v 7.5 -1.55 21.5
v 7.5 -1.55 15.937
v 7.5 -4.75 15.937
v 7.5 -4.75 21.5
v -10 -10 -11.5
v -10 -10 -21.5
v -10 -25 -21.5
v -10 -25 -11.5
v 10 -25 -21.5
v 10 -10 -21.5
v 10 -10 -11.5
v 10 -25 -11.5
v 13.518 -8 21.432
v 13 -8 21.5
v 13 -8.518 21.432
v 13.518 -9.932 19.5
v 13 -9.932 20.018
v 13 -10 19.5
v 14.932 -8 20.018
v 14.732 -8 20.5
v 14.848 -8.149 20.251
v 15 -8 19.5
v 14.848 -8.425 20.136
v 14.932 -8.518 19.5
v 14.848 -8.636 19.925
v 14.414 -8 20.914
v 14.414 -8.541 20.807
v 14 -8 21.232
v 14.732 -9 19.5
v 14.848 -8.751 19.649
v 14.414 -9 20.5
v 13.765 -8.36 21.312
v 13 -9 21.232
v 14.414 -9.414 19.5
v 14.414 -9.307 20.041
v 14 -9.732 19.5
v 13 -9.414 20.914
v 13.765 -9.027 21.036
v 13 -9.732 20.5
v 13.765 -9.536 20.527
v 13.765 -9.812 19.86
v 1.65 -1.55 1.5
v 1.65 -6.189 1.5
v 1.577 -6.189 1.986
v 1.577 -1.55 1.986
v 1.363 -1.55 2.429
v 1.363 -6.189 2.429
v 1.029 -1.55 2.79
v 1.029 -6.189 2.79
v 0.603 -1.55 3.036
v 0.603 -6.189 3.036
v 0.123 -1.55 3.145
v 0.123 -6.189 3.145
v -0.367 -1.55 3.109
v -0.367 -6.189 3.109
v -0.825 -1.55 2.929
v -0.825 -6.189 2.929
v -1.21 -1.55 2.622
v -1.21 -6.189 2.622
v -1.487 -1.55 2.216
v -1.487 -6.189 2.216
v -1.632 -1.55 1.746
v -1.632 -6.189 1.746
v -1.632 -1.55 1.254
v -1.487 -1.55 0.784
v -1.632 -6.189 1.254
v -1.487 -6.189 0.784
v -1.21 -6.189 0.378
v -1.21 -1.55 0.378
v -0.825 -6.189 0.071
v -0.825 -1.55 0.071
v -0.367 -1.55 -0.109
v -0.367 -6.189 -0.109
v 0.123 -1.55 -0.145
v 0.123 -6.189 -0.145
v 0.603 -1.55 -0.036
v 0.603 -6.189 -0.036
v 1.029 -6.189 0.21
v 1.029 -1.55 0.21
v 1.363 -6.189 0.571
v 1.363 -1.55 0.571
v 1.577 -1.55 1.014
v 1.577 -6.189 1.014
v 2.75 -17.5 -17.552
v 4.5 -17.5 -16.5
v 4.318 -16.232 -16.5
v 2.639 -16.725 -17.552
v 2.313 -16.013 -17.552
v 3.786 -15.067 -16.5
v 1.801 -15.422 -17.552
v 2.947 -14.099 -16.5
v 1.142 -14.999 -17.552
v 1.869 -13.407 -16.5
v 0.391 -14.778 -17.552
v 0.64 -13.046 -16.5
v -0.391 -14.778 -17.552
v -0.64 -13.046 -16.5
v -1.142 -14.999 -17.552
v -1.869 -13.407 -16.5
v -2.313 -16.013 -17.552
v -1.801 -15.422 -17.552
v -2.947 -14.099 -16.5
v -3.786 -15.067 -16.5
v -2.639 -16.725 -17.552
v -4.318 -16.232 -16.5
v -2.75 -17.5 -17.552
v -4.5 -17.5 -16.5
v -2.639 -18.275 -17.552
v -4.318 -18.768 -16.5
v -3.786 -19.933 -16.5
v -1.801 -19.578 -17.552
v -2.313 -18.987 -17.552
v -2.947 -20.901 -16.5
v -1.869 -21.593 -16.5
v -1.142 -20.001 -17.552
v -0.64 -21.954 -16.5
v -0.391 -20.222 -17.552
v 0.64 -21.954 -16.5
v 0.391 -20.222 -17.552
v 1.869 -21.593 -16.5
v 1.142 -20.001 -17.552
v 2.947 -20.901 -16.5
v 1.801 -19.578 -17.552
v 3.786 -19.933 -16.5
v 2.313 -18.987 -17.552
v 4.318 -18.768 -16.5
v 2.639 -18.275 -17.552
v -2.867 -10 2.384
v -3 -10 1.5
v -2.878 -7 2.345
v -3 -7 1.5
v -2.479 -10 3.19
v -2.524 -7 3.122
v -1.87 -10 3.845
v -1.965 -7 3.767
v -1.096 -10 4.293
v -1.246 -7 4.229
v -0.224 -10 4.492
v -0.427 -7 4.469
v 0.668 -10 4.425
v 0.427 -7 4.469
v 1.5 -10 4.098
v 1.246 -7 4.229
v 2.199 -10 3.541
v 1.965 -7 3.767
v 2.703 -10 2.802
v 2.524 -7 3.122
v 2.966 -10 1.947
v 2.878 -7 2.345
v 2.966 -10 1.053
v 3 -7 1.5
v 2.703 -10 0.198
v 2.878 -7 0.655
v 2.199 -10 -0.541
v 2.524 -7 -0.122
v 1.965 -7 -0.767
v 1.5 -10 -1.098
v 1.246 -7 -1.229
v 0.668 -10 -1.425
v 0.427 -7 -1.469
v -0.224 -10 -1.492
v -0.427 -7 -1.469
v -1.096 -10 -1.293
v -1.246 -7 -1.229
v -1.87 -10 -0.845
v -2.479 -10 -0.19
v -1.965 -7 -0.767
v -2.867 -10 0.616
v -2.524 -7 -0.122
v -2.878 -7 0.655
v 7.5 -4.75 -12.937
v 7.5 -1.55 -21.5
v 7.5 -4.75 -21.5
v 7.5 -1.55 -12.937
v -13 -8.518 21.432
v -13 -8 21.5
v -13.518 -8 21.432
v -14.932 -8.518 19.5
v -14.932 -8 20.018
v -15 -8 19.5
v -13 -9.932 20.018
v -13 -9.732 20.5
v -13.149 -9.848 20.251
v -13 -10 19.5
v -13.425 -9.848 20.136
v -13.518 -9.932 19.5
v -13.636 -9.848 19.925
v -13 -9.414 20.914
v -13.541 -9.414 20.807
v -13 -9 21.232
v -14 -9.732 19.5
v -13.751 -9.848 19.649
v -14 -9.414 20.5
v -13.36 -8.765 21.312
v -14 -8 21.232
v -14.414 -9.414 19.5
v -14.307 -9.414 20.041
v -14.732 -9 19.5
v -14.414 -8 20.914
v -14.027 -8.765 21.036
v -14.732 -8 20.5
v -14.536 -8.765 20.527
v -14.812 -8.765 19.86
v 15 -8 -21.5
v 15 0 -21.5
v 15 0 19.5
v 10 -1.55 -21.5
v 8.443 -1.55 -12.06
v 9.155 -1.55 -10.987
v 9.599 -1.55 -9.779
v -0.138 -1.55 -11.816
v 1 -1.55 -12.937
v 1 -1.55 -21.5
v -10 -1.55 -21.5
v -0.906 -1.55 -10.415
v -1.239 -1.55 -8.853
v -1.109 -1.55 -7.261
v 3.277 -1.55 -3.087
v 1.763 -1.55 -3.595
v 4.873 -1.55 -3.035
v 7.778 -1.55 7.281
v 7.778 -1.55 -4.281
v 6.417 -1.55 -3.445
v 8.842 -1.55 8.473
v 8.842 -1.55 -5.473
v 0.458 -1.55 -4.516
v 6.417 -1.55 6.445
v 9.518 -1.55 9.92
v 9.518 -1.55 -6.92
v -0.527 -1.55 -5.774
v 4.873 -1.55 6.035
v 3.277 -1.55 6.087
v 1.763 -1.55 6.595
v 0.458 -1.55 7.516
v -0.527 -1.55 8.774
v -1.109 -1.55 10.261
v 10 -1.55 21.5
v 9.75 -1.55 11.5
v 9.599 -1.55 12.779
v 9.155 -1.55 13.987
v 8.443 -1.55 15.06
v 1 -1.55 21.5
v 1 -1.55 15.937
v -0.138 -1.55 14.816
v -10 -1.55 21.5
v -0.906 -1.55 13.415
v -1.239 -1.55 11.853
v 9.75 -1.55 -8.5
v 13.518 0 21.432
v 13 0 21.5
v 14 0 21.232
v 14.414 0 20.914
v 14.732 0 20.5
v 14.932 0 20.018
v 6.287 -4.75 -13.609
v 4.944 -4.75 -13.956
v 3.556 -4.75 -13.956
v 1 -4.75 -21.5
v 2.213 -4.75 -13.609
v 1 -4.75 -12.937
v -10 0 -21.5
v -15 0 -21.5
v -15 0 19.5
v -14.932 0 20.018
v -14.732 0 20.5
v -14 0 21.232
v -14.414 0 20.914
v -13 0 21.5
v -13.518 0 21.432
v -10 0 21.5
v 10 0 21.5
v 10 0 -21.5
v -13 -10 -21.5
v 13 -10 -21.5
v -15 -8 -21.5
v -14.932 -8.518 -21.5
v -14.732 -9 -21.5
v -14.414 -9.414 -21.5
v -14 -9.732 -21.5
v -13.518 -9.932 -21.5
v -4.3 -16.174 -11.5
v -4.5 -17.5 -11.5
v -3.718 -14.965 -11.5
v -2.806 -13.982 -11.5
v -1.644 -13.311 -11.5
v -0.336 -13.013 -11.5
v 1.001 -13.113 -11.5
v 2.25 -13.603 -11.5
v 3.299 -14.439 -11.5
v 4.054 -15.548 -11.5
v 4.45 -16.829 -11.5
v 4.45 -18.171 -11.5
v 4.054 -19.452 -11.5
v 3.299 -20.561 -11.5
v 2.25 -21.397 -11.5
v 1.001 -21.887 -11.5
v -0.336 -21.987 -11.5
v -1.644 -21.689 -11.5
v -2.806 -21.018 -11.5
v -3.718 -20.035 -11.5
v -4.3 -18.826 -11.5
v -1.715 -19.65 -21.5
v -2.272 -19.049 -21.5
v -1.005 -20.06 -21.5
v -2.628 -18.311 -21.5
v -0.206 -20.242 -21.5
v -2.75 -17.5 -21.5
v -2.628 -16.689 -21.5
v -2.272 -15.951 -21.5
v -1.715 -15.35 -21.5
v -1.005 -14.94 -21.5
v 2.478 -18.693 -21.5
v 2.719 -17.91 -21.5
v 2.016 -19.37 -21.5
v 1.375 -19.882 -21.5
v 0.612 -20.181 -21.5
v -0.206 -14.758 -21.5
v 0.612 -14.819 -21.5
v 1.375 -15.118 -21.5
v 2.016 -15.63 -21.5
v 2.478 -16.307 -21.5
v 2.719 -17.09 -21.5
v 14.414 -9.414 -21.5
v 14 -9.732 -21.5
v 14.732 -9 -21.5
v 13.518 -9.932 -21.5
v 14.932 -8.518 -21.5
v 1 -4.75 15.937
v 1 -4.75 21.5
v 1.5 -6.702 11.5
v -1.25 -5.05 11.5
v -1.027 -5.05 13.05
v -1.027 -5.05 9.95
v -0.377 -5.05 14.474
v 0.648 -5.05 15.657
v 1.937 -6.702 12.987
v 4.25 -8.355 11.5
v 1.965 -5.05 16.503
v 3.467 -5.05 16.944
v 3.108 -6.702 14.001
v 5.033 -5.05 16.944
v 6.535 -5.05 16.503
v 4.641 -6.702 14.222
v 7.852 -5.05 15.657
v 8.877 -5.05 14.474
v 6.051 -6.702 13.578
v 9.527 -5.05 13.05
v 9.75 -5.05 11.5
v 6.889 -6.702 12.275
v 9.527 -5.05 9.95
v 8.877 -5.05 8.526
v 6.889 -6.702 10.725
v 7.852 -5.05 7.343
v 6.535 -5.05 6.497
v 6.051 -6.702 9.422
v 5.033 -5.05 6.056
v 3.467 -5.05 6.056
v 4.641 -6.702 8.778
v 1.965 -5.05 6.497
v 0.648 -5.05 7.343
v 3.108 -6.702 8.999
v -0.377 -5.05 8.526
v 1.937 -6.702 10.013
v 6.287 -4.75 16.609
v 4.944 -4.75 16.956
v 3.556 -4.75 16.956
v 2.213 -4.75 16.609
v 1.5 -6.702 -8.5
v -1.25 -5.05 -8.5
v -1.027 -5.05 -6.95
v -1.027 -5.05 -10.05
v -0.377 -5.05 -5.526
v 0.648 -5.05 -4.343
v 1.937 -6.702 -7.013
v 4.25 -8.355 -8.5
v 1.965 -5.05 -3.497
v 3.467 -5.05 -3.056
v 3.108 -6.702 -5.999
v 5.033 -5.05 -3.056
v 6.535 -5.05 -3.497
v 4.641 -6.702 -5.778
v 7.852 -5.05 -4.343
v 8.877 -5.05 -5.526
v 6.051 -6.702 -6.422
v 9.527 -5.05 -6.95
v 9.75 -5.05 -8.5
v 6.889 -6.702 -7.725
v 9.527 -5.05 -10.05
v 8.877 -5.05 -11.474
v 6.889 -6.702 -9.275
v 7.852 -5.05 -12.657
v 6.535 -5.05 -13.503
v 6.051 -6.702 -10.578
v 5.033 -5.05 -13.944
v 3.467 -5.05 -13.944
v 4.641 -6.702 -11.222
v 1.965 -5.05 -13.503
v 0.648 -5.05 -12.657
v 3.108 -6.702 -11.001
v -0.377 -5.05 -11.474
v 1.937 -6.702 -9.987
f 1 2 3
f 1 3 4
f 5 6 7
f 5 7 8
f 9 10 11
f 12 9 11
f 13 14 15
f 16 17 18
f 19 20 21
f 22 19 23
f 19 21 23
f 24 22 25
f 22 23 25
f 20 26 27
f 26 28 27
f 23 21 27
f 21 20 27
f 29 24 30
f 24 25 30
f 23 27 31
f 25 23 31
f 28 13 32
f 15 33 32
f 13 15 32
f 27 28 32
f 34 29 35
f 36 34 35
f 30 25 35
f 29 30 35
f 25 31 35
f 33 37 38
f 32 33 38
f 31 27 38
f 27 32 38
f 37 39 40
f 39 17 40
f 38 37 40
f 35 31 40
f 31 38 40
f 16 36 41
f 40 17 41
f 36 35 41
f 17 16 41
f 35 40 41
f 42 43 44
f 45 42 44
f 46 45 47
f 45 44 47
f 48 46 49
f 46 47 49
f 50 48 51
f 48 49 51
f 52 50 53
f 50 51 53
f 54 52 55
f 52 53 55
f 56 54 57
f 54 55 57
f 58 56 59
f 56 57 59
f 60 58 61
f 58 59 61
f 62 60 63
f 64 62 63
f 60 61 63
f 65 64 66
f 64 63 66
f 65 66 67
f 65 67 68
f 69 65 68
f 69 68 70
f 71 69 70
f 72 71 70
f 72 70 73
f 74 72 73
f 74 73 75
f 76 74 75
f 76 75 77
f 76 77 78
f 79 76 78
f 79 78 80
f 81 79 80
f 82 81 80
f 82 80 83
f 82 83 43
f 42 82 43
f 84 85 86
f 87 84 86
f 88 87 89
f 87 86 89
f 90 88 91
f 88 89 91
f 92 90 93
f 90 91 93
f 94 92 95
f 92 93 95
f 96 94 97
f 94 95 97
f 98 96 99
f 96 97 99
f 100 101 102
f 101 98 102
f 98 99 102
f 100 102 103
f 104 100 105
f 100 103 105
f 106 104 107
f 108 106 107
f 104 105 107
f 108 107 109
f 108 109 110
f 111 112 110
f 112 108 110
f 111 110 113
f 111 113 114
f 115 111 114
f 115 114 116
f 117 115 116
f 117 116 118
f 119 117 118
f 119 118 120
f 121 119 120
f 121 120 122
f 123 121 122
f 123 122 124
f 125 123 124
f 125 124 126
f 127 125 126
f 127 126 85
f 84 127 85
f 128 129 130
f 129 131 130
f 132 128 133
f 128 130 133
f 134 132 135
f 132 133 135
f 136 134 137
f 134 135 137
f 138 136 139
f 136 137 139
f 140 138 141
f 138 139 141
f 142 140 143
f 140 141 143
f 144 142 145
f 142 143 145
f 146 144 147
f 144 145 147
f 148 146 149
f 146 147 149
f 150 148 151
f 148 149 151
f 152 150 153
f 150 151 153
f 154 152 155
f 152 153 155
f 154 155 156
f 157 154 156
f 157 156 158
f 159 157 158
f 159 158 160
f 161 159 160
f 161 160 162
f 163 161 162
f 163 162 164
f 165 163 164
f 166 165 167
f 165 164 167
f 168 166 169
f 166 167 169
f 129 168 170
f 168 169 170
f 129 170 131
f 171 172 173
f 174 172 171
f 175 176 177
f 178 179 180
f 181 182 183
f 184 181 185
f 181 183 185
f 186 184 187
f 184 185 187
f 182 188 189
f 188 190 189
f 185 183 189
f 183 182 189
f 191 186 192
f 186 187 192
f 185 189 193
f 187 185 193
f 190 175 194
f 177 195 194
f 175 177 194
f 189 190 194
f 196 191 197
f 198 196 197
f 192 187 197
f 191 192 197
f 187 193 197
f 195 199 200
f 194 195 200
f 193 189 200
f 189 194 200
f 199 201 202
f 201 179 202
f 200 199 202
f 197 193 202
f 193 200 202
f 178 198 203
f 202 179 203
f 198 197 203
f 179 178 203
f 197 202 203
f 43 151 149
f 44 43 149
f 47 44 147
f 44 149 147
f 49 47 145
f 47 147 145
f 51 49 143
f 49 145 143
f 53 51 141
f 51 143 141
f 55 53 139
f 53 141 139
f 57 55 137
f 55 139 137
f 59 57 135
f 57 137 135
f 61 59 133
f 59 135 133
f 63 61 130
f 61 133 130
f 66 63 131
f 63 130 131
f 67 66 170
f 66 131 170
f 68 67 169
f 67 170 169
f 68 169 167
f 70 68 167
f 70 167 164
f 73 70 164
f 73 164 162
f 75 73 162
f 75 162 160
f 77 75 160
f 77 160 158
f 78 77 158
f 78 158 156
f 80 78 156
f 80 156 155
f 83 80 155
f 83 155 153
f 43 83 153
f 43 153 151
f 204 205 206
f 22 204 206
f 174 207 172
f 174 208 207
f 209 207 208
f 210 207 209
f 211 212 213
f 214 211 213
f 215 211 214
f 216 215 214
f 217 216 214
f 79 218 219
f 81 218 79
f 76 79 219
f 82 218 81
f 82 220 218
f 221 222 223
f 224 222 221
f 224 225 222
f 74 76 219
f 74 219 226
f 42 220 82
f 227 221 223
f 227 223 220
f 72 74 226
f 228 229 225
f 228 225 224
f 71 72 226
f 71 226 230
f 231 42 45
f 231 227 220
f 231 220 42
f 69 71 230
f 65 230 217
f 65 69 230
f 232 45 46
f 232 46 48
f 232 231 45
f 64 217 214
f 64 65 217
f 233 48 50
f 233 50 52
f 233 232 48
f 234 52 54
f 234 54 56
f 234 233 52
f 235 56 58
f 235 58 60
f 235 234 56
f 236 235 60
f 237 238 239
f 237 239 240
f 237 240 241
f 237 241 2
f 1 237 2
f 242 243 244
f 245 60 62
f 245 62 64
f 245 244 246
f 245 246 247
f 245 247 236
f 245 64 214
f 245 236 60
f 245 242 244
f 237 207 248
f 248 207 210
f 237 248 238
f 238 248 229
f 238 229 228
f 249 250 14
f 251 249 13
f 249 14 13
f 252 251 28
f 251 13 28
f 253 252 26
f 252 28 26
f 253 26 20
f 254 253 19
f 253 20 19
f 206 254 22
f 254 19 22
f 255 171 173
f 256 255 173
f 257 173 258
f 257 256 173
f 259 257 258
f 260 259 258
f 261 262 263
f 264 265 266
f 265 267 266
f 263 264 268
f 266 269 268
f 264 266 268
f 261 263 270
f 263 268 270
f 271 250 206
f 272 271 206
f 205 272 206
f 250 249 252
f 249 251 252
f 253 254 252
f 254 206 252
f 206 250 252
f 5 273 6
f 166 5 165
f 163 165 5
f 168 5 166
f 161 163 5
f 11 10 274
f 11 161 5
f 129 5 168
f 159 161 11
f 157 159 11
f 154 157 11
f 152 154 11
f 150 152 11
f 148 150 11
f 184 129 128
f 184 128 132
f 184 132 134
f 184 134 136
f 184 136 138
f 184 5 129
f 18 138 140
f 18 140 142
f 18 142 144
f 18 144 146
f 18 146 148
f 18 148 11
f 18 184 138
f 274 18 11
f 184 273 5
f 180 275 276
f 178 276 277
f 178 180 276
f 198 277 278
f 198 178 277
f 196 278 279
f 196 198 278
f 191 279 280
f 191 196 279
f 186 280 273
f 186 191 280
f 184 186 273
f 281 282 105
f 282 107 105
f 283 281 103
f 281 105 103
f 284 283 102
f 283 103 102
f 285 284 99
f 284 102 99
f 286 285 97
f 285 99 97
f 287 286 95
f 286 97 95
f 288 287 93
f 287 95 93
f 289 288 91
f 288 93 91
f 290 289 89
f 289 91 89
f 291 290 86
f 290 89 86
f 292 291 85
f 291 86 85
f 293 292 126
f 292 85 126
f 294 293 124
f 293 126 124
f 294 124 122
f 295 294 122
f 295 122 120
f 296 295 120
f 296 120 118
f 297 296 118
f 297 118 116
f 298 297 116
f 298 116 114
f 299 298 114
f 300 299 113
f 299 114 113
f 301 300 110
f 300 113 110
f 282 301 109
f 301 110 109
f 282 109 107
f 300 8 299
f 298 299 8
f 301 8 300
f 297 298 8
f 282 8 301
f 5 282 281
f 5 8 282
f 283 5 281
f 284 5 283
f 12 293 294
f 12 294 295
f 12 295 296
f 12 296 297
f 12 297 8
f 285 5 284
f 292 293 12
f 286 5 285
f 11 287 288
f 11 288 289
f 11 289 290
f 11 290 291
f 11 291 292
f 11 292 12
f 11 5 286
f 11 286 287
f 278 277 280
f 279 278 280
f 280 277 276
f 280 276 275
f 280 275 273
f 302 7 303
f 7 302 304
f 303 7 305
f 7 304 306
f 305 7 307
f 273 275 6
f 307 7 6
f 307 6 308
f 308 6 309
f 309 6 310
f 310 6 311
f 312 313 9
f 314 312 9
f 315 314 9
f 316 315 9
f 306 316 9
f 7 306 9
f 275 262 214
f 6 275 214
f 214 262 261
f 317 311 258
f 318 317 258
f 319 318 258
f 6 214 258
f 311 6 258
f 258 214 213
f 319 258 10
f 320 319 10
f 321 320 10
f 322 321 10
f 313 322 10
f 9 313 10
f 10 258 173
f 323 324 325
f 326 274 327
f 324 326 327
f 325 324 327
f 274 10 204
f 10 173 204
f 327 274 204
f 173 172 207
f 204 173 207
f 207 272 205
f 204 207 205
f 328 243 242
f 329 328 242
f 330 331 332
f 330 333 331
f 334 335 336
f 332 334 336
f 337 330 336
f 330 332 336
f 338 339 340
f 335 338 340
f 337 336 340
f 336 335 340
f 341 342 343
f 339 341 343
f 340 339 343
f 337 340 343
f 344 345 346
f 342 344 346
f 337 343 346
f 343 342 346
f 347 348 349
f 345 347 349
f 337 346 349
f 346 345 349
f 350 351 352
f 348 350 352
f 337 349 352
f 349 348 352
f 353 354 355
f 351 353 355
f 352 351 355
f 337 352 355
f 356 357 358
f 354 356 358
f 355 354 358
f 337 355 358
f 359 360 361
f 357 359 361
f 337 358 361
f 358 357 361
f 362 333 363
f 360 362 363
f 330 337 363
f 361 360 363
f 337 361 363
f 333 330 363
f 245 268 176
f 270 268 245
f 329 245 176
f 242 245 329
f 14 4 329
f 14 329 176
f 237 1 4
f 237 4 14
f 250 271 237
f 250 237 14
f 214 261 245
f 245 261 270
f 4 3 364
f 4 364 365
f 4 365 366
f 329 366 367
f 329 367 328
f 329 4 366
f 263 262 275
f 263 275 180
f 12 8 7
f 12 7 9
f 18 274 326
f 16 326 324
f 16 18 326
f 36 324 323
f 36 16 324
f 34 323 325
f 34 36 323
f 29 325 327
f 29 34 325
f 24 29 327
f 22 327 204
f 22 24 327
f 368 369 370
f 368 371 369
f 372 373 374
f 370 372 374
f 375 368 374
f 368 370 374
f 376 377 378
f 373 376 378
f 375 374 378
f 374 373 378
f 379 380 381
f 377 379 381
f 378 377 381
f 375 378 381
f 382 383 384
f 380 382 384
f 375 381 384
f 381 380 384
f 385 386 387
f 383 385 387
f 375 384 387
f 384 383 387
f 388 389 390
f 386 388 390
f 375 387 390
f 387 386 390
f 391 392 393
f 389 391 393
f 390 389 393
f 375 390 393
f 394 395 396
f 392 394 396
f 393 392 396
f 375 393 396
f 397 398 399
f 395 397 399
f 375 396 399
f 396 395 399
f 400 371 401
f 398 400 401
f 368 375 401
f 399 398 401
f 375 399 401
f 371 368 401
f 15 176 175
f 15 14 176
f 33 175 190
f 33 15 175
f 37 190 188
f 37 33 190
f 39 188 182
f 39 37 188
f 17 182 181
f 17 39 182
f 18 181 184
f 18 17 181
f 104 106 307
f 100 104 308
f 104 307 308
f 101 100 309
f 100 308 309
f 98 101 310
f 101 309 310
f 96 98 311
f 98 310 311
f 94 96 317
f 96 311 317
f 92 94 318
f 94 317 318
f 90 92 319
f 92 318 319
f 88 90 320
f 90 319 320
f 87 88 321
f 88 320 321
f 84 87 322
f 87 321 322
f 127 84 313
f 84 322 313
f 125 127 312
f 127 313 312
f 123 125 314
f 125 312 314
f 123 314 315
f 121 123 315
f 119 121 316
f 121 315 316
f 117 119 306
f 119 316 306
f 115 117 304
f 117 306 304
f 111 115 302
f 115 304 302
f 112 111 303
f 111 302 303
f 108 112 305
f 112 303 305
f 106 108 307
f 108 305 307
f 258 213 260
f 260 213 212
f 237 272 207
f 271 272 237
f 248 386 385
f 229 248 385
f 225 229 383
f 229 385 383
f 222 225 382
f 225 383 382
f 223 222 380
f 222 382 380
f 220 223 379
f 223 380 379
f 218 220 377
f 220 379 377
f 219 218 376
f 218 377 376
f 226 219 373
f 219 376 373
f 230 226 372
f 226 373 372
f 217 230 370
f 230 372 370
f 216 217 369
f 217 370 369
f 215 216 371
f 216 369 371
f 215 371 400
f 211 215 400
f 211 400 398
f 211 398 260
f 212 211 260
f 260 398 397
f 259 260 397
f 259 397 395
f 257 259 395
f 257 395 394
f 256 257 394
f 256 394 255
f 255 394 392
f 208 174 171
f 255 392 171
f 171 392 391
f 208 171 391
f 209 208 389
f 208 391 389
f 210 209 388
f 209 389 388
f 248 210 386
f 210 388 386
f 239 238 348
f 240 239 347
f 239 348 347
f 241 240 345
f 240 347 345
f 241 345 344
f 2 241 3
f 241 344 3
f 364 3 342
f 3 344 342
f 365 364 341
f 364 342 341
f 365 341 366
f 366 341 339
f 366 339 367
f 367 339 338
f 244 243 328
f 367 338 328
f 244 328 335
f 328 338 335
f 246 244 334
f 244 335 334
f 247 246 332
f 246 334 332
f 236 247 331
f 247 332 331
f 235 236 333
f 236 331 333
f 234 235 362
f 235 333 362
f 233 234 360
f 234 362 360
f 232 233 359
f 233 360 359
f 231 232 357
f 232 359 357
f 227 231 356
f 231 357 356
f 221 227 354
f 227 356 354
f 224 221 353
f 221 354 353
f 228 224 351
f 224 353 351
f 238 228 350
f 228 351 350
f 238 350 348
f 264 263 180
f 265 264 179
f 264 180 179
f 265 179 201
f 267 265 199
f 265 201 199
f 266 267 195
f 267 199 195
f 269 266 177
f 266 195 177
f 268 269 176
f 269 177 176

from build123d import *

# Parameters (mm, degrees)
F0_W      = 30
F0_H      = 43
F1_DEPTH  = 10
F2_W      = 20
F2_H      = 10
F3_DEPTH  = 15
F5_D      = 5.5
F7_D      = 9
F7_DEPTH  = 5
F7_TIP    = 2.7038727856
F8_W      = 20
F8_H      = 43
F9_DEPTH  = 1.55
F11_D     = 3.3
F13_D     = 6
F13_DEPTH = 3
F13_TIP   = 1.8025818571
F14_W     = 6.5
F14_H     = 10
F15_DEPTH = 3.2
F17_D     = 11
F17_DEPTH = 3.5
F17_TIP   = 3.3047334047
F18_R     = 2


with BuildPart() as f1:
    # F0 (on Front) → F1 (new body)
    with BuildSketch(Plane.XZ):
        Rectangle(F0_W, F0_H)
    extrude(amount=F1_DEPTH)

    # F2 (on face) → F3 (join)
    with BuildSketch(Plane.XZ.offset(10)):
        with Locations((0, -16.5)):
            Rectangle(F2_W, F2_H)
    extrude(amount=F3_DEPTH)

    # F5 (through all)
    with Locations(Plane.XY.offset(-11.5)):
        with Locations((0, -17.5)):
            Hole(F5_D / 2)

    # F7
    with Locations(Plane.XY.offset(-11.5)):
        with Locations((0, -17.5)):
            Hole(F7_D / 2, depth=F7_DEPTH)
            with Locations((0, 0, -(F7_DEPTH + F7_TIP / 2))):  # 118° drill point
                Cone(0, F7_D / 2, F7_TIP, mode=Mode.SUBTRACT)

    # F8 (on face) → F9 (cut)
    with BuildSketch(Plane(origin=(0, 0, 0), x_dir=(-1, 0, 0), z_dir=(0, 1, 0))):
        Rectangle(F8_W, F8_H)
    extrude(amount=-F9_DEPTH, mode=Mode.SUBTRACT)

    # F11 (through all)
    with Locations(Plane(origin=(0, -1.55, 0), x_dir=(-1, 0, 0), z_dir=(0, 1, 0))):
        with Locations((0, 1.5)):
            Hole(F11_D / 2)

    # F13
    with Locations(Plane.XZ.offset(10)):
        with Locations((0, 1.5)):
            Hole(F13_D / 2, depth=F13_DEPTH)
            with Locations((0, 0, -(F13_DEPTH + F13_TIP / 2))):  # 118° drill point
                Cone(0, F13_D / 2, F13_TIP, mode=Mode.SUBTRACT)

    # F14 (on face) → F15 (cut)
    with BuildSketch(Plane(origin=(0, -1.55, 0), x_dir=(-1, 0, 0), z_dir=(0, 1, 0))):
        with Locations((-4.25, 16.5)):
            Rectangle(F14_W, F14_H)
        with Locations((-4.25, -16.5)):
            Rectangle(F14_W, F14_H)
    extrude(amount=-F15_DEPTH, mode=Mode.SUBTRACT)

    # F17
    with Locations(Plane(origin=(0, -1.55, 0), x_dir=(-1, 0, 0), z_dir=(0, 1, 0))):
        with Locations((-4.25, -8.5), (-4.25, 11.5)):
            Hole(F17_D / 2, depth=F17_DEPTH)
            with Locations((0, 0, -(F17_DEPTH + F17_TIP / 2))):  # 118° drill point
                Cone(0, F17_D / 2, F17_TIP, mode=Mode.SUBTRACT)

    # F18
    f18_edges = [f1.edges().sort_by_distance(p)[0] for p in [
        (-15, -5, 21.5),
        (0, -10, 21.5),
        (-15, -10, 0),
        (15, -5, 21.5),
        (15, -10, 0),
    ]]
    fillet(f18_edges, radius=F18_R)


solid = f1.part
